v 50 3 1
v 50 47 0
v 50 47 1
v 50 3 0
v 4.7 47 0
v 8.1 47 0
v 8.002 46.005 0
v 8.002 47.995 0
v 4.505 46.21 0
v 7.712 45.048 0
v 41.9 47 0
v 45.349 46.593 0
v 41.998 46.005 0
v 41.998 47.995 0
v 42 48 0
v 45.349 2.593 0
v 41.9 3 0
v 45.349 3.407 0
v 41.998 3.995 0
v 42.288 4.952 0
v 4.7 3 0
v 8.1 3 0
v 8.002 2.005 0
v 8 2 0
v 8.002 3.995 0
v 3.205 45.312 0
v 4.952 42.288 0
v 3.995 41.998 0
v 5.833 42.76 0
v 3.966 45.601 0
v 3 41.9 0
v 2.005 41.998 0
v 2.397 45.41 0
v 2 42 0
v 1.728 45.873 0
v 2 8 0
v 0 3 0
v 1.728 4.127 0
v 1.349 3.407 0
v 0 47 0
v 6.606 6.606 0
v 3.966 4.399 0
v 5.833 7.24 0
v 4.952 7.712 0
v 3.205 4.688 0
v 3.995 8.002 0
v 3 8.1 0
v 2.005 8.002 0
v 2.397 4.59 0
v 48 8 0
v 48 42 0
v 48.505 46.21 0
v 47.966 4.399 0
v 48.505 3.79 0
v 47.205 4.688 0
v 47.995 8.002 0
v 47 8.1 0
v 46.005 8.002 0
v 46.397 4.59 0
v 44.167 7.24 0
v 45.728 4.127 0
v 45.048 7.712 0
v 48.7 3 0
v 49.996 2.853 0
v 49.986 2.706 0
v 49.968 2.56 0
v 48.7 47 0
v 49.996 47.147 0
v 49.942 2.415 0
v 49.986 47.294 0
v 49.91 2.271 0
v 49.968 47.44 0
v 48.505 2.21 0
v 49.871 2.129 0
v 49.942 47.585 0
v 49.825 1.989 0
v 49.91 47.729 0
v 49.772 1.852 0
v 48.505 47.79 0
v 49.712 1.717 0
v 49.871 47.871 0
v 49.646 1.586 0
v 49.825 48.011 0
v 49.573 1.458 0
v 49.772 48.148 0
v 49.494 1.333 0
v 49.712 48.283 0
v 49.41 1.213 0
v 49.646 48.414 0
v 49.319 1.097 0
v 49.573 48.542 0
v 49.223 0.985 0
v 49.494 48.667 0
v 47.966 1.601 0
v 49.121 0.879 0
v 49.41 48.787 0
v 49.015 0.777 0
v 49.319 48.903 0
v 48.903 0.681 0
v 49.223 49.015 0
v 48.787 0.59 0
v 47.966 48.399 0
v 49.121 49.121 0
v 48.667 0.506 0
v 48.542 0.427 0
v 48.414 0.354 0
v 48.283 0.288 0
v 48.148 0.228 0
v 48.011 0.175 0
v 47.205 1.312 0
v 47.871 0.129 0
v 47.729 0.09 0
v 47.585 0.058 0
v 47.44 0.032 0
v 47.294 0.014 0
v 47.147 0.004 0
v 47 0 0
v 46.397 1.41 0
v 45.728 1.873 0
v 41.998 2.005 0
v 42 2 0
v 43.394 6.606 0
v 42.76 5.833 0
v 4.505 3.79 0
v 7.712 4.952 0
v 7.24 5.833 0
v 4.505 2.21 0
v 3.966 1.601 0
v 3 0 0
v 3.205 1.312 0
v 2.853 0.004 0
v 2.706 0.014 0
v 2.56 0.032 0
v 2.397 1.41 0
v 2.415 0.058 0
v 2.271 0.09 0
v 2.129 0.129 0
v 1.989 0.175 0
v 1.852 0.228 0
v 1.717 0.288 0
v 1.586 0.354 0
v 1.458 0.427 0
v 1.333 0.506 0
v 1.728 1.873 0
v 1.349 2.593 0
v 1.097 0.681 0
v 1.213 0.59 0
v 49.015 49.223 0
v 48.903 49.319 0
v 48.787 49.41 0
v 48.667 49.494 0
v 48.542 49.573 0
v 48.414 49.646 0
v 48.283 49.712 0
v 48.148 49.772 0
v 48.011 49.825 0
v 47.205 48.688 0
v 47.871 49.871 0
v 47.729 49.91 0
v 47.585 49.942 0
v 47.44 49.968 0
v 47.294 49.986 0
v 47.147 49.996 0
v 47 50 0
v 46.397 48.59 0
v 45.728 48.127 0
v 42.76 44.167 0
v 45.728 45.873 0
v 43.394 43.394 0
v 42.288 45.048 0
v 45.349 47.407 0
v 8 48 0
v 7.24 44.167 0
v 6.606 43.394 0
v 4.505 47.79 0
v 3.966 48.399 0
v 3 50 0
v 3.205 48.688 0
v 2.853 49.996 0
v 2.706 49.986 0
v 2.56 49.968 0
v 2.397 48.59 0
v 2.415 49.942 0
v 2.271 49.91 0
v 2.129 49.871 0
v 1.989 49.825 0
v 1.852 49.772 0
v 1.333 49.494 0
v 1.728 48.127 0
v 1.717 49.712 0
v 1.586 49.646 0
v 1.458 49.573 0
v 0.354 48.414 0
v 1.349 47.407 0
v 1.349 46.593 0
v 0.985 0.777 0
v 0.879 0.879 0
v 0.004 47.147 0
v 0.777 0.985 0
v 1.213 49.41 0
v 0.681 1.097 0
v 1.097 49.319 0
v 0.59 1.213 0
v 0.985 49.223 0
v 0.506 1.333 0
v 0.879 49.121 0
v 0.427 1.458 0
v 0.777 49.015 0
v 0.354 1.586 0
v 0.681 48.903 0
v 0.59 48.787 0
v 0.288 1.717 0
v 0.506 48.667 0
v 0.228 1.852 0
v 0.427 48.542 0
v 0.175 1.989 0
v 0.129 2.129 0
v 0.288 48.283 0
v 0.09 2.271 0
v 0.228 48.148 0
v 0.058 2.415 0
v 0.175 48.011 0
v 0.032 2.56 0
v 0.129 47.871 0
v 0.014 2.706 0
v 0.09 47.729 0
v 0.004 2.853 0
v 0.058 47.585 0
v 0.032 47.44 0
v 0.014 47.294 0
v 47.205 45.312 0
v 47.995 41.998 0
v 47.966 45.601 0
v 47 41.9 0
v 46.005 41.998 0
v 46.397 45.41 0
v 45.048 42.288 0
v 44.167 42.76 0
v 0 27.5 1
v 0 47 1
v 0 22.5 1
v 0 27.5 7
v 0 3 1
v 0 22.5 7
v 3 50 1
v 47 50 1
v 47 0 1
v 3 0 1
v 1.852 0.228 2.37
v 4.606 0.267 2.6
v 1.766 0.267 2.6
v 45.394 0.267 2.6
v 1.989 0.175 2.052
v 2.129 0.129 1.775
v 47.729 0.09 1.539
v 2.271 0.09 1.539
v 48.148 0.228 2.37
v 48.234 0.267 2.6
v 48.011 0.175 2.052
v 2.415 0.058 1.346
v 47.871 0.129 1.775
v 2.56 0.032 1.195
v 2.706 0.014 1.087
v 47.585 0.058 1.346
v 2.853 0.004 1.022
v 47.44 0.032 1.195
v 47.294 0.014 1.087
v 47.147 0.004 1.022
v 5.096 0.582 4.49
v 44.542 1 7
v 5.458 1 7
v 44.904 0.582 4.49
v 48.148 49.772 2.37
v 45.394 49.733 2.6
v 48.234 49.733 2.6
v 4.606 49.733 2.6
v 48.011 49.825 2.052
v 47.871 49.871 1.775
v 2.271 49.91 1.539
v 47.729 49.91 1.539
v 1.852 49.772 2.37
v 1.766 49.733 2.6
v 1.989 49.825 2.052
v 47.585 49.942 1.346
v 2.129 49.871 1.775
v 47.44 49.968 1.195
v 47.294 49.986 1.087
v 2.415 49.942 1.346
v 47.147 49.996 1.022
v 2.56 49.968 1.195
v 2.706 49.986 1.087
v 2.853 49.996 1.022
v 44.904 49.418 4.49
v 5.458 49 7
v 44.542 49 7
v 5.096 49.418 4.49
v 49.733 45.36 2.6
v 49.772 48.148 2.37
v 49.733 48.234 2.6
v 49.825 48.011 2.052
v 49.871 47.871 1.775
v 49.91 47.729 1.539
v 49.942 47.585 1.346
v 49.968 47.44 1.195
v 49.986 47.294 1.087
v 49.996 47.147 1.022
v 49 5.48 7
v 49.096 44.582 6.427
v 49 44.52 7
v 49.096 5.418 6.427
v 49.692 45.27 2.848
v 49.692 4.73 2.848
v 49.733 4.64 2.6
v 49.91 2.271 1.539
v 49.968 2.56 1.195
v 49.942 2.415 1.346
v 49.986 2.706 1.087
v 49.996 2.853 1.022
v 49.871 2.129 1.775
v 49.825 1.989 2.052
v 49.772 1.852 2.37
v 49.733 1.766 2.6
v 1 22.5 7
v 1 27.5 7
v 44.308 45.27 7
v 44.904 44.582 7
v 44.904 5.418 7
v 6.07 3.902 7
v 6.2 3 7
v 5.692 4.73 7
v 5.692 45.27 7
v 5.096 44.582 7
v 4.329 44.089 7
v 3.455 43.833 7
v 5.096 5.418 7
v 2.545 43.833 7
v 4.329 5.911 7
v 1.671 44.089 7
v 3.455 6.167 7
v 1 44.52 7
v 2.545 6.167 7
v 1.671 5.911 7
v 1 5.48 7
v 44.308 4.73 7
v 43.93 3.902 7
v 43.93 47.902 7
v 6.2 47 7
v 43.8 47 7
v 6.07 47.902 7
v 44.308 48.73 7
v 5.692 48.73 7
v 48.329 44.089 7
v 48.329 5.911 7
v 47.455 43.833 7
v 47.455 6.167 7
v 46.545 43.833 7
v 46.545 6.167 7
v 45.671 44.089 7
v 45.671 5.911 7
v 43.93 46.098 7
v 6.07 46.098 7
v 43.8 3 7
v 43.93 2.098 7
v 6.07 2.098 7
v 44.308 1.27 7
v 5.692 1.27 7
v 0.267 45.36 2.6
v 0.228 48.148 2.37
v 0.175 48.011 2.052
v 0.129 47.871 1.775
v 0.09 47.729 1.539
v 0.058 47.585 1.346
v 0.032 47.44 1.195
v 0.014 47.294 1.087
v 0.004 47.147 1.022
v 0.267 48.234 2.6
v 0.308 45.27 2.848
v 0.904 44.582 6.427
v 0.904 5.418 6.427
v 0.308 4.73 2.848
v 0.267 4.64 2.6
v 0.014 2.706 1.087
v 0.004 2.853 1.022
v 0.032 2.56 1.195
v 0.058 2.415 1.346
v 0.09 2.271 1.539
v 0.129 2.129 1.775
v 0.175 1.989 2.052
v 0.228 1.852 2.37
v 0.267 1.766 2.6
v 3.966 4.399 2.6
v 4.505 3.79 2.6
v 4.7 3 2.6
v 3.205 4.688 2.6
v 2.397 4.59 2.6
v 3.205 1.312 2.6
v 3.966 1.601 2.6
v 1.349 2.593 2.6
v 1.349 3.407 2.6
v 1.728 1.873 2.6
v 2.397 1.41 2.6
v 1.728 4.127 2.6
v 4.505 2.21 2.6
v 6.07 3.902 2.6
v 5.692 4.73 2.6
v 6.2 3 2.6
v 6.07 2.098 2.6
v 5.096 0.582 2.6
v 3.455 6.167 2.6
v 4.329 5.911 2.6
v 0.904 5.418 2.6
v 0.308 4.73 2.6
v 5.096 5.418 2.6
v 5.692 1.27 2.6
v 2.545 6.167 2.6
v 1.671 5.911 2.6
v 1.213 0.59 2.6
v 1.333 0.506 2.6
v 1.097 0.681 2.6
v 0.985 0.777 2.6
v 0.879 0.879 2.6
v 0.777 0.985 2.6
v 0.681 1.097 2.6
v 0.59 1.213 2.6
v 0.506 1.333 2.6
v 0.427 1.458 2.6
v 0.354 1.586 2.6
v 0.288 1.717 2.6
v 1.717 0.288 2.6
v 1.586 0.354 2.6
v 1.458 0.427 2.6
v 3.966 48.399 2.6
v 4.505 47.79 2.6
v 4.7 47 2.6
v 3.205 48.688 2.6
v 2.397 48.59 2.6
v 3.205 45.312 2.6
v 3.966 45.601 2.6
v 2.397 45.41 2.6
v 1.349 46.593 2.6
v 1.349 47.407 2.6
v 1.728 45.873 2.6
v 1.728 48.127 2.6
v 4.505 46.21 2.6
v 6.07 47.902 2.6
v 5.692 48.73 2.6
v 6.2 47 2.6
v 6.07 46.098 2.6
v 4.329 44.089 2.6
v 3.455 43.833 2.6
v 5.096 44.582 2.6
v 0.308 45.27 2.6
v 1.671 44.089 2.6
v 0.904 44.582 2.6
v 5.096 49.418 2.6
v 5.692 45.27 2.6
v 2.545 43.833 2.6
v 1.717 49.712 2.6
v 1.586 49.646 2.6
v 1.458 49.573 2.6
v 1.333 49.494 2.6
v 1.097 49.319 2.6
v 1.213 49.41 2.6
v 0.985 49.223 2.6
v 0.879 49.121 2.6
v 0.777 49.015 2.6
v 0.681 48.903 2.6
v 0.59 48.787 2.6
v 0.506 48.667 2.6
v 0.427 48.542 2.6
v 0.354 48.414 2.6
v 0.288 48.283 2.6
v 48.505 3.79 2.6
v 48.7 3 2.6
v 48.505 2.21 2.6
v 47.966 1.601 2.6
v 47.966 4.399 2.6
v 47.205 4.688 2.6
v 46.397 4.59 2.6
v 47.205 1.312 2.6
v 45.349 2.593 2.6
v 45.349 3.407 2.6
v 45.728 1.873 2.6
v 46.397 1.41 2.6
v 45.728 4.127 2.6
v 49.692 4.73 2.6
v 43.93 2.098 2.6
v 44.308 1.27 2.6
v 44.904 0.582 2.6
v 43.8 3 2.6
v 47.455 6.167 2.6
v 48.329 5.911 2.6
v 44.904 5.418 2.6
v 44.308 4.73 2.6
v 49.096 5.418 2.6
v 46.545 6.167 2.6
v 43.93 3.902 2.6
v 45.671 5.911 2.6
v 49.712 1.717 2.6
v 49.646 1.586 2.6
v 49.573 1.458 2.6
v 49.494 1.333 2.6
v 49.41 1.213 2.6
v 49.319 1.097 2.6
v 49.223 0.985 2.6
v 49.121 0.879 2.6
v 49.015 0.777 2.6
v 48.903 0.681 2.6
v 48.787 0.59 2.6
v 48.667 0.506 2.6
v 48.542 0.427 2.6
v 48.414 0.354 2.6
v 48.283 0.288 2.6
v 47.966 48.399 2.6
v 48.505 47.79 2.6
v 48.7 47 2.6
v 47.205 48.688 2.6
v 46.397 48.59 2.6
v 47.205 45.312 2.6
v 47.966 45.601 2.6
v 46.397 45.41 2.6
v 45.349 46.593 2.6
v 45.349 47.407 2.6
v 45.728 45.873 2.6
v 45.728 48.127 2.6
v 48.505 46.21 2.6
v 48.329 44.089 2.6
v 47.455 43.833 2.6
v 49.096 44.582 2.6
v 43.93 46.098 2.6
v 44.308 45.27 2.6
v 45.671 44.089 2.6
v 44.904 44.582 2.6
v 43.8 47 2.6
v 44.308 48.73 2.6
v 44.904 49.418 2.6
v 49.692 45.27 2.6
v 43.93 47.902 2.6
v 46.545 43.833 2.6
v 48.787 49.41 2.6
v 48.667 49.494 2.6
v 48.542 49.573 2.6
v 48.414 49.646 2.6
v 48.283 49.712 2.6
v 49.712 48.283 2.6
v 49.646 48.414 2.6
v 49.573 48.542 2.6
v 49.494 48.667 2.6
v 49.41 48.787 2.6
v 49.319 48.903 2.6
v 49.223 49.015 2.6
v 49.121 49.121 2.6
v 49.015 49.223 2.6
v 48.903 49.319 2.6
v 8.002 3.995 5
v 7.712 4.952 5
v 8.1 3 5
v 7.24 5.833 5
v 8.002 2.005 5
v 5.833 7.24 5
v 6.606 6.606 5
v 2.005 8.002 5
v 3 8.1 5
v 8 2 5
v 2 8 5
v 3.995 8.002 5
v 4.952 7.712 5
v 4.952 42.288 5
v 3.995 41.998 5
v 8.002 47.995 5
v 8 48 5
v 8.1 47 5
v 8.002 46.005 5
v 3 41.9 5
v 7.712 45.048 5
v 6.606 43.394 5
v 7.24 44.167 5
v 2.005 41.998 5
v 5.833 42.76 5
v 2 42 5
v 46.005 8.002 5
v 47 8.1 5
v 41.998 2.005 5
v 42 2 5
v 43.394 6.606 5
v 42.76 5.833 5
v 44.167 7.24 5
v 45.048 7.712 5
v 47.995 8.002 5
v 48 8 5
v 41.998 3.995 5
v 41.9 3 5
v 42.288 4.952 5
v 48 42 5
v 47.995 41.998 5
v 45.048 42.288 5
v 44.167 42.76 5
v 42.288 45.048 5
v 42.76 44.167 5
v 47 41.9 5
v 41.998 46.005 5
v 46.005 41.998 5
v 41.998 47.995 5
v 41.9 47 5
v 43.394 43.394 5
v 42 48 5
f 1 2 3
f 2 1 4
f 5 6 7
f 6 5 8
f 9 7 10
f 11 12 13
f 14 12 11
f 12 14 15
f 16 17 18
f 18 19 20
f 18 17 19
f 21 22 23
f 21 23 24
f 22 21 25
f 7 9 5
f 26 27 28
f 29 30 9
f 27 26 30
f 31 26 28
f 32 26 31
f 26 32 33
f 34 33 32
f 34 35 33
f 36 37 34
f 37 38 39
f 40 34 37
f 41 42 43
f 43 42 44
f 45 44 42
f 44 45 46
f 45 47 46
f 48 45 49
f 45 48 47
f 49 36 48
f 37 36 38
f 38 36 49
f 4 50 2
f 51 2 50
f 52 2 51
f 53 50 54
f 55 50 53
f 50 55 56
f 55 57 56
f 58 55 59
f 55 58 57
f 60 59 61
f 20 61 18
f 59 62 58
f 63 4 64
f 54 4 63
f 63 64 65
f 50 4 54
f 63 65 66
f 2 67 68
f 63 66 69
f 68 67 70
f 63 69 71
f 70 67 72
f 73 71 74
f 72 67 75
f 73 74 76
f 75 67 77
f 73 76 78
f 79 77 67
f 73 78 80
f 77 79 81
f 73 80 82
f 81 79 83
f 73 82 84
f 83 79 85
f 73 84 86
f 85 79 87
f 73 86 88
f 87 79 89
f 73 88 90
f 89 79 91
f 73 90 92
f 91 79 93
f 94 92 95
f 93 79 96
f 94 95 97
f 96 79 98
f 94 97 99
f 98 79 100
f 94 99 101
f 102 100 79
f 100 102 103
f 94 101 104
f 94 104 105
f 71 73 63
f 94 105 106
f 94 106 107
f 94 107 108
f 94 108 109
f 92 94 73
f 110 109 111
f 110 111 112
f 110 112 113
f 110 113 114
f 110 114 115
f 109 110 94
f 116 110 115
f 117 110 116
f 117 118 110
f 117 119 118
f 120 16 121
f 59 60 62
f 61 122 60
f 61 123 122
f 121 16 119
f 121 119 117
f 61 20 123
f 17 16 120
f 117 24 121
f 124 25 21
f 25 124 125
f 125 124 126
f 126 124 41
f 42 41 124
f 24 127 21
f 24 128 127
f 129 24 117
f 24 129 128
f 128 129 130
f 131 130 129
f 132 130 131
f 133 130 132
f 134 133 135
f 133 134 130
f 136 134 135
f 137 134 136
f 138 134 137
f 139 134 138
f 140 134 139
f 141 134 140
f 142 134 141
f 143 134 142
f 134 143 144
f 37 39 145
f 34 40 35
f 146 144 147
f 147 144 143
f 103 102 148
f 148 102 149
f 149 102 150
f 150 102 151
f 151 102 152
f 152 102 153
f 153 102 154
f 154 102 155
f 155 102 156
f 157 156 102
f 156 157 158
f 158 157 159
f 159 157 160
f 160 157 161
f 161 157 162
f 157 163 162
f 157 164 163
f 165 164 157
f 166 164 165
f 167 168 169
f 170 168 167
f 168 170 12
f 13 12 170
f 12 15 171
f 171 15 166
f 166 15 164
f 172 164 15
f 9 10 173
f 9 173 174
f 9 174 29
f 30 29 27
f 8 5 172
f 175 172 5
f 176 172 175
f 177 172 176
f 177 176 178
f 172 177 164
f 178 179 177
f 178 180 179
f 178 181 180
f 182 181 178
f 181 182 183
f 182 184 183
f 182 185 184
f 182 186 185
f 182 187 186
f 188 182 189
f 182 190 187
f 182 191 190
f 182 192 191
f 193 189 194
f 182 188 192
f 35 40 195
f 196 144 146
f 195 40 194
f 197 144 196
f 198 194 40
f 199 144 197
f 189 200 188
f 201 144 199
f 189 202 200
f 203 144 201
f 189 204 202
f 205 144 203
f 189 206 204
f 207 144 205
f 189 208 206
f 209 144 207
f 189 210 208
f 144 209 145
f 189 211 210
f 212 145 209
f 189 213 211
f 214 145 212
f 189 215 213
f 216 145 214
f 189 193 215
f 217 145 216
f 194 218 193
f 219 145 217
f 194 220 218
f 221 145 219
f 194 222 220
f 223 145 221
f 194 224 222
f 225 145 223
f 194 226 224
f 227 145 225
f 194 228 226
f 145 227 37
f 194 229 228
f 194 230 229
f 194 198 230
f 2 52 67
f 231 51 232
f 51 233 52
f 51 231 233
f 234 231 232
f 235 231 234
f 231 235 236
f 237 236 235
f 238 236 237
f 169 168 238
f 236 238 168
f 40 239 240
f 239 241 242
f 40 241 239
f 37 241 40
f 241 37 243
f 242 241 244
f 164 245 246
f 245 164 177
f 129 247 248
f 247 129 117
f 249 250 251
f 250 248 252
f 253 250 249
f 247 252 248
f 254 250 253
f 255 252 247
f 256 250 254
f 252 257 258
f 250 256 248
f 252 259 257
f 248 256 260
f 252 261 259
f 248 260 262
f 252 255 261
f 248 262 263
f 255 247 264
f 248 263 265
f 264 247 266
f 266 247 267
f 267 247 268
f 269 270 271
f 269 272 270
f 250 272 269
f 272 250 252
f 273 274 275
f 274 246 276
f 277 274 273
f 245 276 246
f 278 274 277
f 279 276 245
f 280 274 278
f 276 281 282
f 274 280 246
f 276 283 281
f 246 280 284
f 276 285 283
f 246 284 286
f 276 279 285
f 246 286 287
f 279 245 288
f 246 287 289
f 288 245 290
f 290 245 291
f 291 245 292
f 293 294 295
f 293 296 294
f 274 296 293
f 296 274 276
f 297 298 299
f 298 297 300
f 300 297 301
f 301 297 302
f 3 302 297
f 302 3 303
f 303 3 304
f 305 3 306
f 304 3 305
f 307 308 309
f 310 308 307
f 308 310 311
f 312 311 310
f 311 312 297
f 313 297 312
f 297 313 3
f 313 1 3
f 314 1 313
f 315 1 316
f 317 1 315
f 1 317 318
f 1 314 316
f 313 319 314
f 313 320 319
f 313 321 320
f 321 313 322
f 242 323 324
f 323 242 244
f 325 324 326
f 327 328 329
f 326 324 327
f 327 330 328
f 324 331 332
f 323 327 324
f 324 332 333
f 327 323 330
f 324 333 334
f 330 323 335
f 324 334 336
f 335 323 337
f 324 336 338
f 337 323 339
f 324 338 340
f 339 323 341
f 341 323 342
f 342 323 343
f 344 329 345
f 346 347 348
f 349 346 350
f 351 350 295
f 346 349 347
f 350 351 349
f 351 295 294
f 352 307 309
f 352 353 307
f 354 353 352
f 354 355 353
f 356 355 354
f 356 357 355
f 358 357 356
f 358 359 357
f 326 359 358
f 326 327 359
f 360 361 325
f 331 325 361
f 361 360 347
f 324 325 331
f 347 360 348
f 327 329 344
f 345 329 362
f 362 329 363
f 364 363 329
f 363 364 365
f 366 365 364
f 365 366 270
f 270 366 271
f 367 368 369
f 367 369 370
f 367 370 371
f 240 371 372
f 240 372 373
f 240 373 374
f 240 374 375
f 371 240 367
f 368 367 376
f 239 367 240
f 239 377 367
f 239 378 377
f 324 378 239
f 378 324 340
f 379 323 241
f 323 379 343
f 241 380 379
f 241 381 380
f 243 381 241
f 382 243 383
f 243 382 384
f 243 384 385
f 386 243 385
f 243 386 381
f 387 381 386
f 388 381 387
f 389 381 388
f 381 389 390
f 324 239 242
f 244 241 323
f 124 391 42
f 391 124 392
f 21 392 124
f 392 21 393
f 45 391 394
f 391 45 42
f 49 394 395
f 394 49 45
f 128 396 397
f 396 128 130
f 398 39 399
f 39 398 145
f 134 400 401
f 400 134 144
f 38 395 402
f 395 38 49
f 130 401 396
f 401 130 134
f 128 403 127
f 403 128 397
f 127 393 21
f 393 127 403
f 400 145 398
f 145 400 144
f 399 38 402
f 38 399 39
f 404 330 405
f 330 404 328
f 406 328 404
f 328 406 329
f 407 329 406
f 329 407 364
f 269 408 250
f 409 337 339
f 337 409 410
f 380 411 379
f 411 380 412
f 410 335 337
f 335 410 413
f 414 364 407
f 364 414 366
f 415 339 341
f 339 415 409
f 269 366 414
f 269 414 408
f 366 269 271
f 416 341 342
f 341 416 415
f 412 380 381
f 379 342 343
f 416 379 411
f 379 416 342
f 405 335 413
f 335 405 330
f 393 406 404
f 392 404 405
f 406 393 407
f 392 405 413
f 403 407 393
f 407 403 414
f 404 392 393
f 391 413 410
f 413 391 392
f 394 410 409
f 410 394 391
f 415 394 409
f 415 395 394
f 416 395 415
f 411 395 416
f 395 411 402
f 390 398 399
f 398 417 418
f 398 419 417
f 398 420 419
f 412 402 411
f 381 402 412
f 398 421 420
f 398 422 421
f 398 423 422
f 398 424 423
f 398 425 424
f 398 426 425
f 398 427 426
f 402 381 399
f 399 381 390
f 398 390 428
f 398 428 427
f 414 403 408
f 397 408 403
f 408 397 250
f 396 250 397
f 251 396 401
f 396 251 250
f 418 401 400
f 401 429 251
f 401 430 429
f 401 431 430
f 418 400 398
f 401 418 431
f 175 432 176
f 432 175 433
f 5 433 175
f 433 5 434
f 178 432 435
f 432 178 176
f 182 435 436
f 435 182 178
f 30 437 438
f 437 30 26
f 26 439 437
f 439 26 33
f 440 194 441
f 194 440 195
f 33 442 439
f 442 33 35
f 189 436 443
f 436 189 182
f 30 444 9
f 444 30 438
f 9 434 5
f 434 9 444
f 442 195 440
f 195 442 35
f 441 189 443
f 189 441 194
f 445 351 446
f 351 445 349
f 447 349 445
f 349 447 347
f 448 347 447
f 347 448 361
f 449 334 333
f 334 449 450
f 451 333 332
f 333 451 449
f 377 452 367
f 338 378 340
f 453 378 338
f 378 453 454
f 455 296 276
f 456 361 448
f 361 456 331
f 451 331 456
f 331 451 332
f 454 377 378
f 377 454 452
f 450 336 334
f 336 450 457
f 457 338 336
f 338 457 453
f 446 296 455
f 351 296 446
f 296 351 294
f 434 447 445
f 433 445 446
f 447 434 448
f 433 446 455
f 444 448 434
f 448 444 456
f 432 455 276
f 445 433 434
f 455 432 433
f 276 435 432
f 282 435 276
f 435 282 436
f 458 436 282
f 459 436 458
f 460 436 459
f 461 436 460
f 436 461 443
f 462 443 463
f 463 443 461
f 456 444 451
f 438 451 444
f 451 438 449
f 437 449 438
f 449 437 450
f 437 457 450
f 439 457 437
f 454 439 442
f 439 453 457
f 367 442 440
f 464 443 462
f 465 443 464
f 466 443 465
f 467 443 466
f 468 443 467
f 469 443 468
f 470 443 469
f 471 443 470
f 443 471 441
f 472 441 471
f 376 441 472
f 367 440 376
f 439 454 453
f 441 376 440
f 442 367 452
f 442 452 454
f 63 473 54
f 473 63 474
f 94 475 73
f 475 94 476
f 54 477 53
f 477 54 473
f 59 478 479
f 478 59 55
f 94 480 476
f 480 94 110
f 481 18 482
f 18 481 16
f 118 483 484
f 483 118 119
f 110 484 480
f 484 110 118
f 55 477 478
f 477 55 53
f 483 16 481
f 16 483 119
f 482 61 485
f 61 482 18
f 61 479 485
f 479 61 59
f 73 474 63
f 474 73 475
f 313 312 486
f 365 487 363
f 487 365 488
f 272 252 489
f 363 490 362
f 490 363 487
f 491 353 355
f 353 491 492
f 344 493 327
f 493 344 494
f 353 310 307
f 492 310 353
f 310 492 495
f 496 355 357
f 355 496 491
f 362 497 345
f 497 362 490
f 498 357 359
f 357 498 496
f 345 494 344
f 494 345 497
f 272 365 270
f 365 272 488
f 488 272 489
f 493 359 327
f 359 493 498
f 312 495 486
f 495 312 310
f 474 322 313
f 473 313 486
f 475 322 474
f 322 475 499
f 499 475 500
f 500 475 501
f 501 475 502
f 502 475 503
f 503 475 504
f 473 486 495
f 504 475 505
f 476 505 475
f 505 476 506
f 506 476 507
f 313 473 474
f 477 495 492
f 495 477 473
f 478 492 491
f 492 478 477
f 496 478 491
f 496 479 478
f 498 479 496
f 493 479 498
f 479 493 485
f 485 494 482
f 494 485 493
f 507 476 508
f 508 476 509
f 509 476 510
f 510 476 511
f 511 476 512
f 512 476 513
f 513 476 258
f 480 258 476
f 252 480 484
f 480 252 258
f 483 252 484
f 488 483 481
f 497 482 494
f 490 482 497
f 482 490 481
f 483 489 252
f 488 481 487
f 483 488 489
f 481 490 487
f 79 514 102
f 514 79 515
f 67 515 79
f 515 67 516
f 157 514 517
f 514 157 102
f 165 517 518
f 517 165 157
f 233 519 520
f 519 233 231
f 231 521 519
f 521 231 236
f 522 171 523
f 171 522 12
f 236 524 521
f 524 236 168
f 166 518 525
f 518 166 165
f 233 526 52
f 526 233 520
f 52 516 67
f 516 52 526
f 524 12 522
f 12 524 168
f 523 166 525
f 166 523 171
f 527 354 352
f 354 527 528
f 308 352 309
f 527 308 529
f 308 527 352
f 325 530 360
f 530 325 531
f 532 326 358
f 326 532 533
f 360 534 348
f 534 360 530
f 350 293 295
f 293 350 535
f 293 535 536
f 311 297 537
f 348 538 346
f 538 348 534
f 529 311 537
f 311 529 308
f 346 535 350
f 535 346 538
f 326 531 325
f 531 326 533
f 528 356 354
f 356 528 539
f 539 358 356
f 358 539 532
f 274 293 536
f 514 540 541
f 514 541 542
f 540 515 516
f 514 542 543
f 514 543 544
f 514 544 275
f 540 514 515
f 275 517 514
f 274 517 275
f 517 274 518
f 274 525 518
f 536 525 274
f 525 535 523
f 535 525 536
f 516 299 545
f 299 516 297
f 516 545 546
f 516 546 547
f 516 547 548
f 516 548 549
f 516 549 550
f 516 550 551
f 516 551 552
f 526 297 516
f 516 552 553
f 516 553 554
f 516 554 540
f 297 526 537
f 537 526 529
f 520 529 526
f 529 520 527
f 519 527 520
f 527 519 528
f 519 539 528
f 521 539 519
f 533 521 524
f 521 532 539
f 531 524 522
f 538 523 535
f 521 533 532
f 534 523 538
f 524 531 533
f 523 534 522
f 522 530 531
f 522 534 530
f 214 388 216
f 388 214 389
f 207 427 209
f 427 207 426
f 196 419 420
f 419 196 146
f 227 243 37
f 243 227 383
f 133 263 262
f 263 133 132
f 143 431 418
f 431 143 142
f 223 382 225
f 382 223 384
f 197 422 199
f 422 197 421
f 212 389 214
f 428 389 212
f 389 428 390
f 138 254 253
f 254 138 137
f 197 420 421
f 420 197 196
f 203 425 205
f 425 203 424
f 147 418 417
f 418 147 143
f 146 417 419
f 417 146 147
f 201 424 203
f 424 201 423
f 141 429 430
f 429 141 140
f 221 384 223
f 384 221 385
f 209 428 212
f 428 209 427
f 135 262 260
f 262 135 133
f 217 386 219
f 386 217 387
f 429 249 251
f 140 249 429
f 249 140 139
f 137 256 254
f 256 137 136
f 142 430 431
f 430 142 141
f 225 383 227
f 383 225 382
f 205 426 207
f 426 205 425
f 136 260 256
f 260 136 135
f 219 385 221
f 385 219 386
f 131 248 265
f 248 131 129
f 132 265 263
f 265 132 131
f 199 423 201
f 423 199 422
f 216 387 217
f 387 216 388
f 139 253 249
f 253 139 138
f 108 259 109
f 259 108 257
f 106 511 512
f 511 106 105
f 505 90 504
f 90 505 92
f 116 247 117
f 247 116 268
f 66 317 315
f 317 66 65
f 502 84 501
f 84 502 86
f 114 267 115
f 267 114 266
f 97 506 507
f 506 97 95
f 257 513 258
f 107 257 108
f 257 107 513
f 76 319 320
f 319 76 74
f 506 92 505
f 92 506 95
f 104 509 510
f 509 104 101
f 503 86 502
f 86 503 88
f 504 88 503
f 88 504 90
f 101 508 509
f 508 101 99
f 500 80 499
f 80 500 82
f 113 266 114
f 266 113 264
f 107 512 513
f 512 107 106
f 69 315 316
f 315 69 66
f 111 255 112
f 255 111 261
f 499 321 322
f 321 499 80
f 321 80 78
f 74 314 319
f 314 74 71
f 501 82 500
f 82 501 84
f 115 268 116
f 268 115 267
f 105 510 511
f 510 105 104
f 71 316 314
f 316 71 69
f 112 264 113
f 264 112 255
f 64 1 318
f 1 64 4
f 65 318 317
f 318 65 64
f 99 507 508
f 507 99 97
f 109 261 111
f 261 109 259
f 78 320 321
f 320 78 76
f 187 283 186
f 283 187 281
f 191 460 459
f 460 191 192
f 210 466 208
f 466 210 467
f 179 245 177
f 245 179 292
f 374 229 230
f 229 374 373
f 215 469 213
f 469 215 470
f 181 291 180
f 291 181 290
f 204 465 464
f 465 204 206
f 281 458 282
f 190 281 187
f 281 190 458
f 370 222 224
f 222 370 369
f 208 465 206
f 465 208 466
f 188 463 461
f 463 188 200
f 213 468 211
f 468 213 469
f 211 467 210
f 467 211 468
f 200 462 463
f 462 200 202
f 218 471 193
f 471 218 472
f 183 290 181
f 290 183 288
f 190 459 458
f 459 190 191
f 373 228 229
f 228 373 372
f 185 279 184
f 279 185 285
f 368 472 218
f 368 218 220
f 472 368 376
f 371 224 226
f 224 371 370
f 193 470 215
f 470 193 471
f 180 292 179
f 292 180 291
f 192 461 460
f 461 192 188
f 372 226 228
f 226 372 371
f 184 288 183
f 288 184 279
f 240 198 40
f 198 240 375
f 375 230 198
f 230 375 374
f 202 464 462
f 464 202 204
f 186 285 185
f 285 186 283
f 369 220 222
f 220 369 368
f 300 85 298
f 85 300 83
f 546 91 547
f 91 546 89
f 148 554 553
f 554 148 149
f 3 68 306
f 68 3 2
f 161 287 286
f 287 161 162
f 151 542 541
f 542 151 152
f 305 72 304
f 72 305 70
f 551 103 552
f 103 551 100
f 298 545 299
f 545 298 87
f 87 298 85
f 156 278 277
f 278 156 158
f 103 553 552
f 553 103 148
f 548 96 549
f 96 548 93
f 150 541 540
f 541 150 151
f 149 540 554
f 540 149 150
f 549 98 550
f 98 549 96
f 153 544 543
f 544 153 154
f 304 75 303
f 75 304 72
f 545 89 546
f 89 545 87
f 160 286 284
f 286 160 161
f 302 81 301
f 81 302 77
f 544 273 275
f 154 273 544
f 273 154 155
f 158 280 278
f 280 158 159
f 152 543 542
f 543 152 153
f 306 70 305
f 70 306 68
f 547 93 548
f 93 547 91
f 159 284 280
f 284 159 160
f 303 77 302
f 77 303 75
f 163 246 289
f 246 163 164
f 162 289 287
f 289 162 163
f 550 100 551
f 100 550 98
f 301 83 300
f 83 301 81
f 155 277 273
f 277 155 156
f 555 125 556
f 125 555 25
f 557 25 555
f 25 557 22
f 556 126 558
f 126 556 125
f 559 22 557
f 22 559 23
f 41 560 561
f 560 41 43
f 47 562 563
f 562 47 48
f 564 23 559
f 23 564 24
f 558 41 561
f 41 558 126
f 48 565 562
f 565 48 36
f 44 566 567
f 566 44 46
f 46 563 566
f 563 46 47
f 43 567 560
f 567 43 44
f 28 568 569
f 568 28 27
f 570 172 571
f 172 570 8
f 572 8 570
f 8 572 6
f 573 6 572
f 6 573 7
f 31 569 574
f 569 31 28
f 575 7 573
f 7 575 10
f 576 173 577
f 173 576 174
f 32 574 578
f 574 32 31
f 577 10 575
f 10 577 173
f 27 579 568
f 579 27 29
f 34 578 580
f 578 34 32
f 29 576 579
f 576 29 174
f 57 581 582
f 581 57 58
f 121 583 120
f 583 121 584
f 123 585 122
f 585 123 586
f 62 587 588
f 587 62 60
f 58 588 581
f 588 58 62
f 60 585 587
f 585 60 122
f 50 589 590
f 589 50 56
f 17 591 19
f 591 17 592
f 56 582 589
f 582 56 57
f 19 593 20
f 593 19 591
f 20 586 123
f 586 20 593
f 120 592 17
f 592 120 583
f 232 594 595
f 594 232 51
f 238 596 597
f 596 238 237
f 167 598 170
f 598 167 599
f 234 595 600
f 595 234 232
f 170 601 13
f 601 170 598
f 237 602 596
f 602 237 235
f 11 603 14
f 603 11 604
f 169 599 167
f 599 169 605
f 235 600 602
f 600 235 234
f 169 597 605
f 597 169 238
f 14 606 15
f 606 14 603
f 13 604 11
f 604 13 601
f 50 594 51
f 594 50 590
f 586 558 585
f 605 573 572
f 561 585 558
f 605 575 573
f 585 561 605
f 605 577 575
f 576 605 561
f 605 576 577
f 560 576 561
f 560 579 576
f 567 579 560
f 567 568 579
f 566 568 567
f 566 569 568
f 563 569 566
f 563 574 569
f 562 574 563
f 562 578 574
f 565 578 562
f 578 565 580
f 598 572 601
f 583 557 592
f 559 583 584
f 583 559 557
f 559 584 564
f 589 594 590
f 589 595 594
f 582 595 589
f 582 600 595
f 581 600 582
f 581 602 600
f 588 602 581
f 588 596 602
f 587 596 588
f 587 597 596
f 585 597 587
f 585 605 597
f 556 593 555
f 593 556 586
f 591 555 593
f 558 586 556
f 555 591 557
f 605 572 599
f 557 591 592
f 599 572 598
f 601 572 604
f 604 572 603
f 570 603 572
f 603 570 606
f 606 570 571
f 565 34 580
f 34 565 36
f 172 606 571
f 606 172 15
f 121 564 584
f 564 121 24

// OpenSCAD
// file: ../lib/utils.scad
module clearance_hole(d, h=100, clearance=0.2, e=0.1) {
	cylinder(r=(d+clearance)/2, h=h+e, $fn=min(64, 4 + 3*d));
}

module z_fillet(r=5, h=100, e=0.1) {
	difference() {
	translate([0-e, 0-e, 0])
		cube([r+e, r+e, h]);
	translate([r, r, 0-e])
		cylinder(r=r, h=h+e+e, $fn=$fn*4);
	}
}

module hexagonal_prism(d_flat=8, h=10) {
    r = d_flat / sqrt(3); // Circumradius
    cylinder(h=h, r=r, $fn=6);
}

module grip_texture(length, depth, height) {
	n = floor(length/depth); // TODO: number of teeth
	e = 0.1;
	xOffset = (length - depth*n)/2;
	difference() {
		translate([0, 0-e, 0-e])
		cube([length, depth+e, height+e+e]);
		for (i = [0:n]) {
			translate([i*depth*2 - xOffset, depth, 0-e])
			cylinder(r=depth, h=height+e+e, $fn=4);
		}
	}
}

module lanyard_loop(length=30, width=8, height=10, overflow=0, slotDiameter=5) {
	e=0.1;
	wall = (height - slotDiameter)/2;
	assert(wall > 0, "slotDiameter too large for lanyard loop");
	difference() {
		union() {
			translate([0-overflow, 0, 0])
			cube([height+overflow, length, width]);
			translate([0, length, 0])
				z_fillet(height/2, h=width);
		}
		translate([height, 0, 0-e])
		rotate([0, 0, 90])
		z_fillet(height/2);
		translate([height, length, 0-e])
		rotate([0, 0, 180])
		z_fillet(height/2);

		// slot
		slotLength = length - wall*3 - slotDiameter;
		translate([wall, wall, 0-e])
			round_rect(size=[slotDiameter, slotLength, width+e+e], r=slotDiameter/2);
		translate([height/2, length - slotDiameter/2 - wall, 0-e])
		cylinder(r=slotDiameter/2, h=width+e+e);
	}
}

module round_rect(size=[10, 10, 10], r=1) {
	difference() {
		cube(size);
		if (r > 0) {
			for (i = [[0,0,0], [1,0,90], [1,1,180], [0,1,270]]) {
				translate([i[0]*size[0], i[1]*size[1], -.1])
				rotate([0, 0, i[2]])
					z_fillet(r, h=size[2]+0.2);
			}
		}
	}
}

function mounting_bolts(length, width, holeOffset) = [
	[ holeOffset, holeOffset],
	[ holeOffset, width - holeOffset],
	[ length - holeOffset, holeOffset],
	[ length - holeOffset, width - holeOffset]
];

function hexWrenchSize(width) = width / 2 * sqrt(3);
// file: ../cover.scad
use <lib/utils.scad>;

module case_cover(
	length=47,
	width=50,
	thickness=4,
	hex=false,
	topThickness = 2,
	counterboreDepth=3,
	counterboreDiameter=8) {

	bottomThickness = 1;
	mountHoleOffset = 3; // must match the value in case_frame
	mountHoleSize = 3.2;
	draftOffset = 1;
	wallThickness = 2;
	wrenchSize = hexWrenchSize(counterboreDiameter);
	echo("Counterbore size: ", counterboreDiameter, "\n");
	echo("Wrench size: ", wrenchSize, "\n");
	e = 0.1; // small waste number; not for final geometry

	assert(thickness >= (counterboreDepth+bottomThickness), "case_cover thickness is too small");

	difference() {
		union() {
			cube([
				length,
				width,
				bottomThickness
			]);
			translate([0, 0, bottomThickness])
				truncated_pyramid(length=length, width=width, height=thickness-bottomThickness, inset=draftOffset);

			// Feet - for stability
			footWidth = 5;
			translate([0, (width - footWidth)/2, 0])
				cube([ length/2, footWidth, thickness]);

		}

		for (
			position = mounting_bolts(length, width, mountHoleOffset)
		) {
			translate([position[0], position[1], 0]) {
				clearance_hole(mountHoleSize);
				translate([0,0, thickness - counterboreDepth])
				if (hex) {
					cylinder(r=counterboreDiameter/2, h=counterboreDepth+e+e, $fn=6);
				} else {
					clearance_hole(counterboreDiameter, counterboreDepth+e);
				}
			}
		}

		// Remove corner material if hex
		if (hex) {
			positions = mounting_bolts(length, width, mountHoleOffset);
			hexCornerDifference( // bottom-right
				position=positions[0],
				angle=-120,
				width=wrenchSize,
				depth=counterboreDepth,
				thickness=thickness
			);
			hexCornerDifference( // bottom-left
				position=positions[1],
				angle=120,
				width=wrenchSize,
				depth=counterboreDepth,
				thickness=thickness
			);
			hexCornerDifference( // top-right
				position=positions[2],
				angle=300,
				width=wrenchSize,
				depth=counterboreDepth,
				thickness=thickness
			);
			hexCornerDifference( // top-left
				position=positions[3],
				angle=60,
				width=wrenchSize,
				depth=counterboreDepth,
				thickness=thickness
			);
		}

		// Corner Radiuses
		translate([0, 0, 0-e])          rotate([0, 0, 0])    z_fillet(3);
		translate([length, 0, 0-e])     rotate([0, 0, 90])   z_fillet(3);
		translate([0, width, 0-e])      rotate([0, 0, 270])  z_fillet(3);
		translate([length, width, 0-e]) rotate([0, 0, 180])  z_fillet(3);

		// Inner cavity
		difference() {
			translate([
				wallThickness,
				wallThickness,
				0-e
			])
			cube([
				length - 2*wallThickness,
				width - 2*wallThickness,
				thickness - topThickness + e
			]);

			for (position = mounting_bolts(length, width, mountHoleOffset)) {
				translate([position[0], position[1], 0-e]) {
					innerCavityRadius = max((counterboreDiameter/2)+topThickness,wallThickness);
					cylinder(r=innerCavityRadius, h=thickness-topThickness+e+e);
				}
			}
		}
	}

}

module hexCornerDifference(
	position,
	angle,
	width,
	depth,
	thickness
) {
	length=100; // any long enough number
	translate([position[0], position[1], 0])
	rotate([0,0,angle])
	translate([0, 0-width/2, thickness-depth])
		cube([length, width, depth]);
}

module truncated_pyramid(length, width, height, inset=5) {
	polyhedron(
		points=[
			[0      , 0     , 0]      , // 0
			[length , 0     , 0]      , // 1
			[length , width , 0]      , // 2
			[0      , width , 0]      , // 3

			[inset        , inset       , height] , // 4
			[length-inset , inset       , height] , // 5
			[length-inset , width-inset , height] , // 6
			[inset        , width-inset , height] , // 7
		],
		faces=[
			[1, 0, 4],
			[4, 5, 1],
			[2, 1, 5],
			[5, 6, 2],
			[3, 2, 6],
			[6, 7, 3],
			[0, 3, 7],
			[7, 4, 0],
			[7, 6, 5],
			[4, 7, 5],
			[0, 1, 3],
			[1, 2, 3],
		],
		convexity=1
	);
}

case_cover($fn=32);
// main file
use <../cover.scad>;

width=50;
length=50;
topThickness=2;
cavityClearance=5; // space for cables
fastenerThickness=2.6; // thickness at the fasteners

thickness = topThickness + cavityClearance;

case_cover(
	length=length,
	width=width,
	hex=false,
	thickness=thickness,
	topThickness=topThickness,
	counterboreDepth=(thickness-fastenerThickness),
	counterboreDiameter=6.2,
	$fn=32
);
